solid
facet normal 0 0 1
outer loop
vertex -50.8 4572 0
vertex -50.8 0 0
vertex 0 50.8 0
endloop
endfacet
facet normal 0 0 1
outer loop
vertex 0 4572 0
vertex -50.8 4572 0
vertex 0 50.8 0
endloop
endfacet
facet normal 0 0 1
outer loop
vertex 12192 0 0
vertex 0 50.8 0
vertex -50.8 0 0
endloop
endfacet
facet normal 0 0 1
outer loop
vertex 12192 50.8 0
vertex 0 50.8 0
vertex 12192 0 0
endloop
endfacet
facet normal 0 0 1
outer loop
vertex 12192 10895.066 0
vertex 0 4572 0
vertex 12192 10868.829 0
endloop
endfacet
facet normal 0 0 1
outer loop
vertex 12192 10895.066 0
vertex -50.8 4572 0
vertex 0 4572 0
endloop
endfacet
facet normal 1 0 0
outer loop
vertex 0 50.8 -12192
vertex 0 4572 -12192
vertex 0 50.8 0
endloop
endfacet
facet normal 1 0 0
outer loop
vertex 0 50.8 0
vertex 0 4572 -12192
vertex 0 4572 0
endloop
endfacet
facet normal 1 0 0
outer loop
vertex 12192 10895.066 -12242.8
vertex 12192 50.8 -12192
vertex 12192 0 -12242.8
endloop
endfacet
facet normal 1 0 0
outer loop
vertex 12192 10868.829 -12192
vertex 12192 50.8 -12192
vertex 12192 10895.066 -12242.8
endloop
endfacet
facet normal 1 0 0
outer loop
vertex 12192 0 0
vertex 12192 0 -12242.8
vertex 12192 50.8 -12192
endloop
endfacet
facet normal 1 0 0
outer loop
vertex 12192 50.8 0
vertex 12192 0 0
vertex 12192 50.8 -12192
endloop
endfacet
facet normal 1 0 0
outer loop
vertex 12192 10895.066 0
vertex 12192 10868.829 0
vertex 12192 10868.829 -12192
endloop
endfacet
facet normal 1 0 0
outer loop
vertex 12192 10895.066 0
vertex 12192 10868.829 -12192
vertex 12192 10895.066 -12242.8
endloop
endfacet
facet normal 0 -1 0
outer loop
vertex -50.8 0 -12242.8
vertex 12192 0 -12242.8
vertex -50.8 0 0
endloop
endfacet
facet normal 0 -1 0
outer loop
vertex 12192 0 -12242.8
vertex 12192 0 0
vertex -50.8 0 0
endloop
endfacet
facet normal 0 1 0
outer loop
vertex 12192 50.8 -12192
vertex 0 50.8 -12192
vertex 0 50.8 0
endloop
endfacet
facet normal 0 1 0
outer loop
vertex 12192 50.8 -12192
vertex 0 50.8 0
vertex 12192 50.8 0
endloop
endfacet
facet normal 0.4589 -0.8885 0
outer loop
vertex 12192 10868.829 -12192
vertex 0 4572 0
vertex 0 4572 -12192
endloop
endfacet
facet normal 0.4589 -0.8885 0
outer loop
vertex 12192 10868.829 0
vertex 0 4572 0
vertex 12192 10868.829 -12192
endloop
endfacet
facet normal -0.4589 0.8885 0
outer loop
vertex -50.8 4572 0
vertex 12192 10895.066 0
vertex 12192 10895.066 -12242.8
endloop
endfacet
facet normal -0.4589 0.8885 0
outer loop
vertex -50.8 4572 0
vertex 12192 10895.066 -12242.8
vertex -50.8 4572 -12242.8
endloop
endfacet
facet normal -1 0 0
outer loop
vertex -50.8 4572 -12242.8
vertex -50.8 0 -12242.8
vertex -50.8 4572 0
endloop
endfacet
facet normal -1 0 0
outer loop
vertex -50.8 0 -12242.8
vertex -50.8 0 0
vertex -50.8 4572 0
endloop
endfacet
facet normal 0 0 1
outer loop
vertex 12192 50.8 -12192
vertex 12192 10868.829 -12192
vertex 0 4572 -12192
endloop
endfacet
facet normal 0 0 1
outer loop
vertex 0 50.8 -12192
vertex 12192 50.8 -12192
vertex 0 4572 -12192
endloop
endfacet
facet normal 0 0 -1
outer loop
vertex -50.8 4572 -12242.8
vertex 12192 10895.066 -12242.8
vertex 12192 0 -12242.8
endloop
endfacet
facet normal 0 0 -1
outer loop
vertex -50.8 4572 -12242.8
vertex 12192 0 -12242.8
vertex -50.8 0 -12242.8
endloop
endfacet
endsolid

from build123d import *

# Parameters (mm, degrees)
SKETCH2_W           = 12192
SKETCH2_H           = 12192
BOSS_EXTRUDE1_DEPTH = 50.8
SKETCH3_W           = 12192
SKETCH3_H           = 4572
BOSS_EXTRUDE2_DEPTH = 50.8
SKETCH4_W           = 12242.8
SKETCH4_H           = 4572
BOSS_EXTRUDE3_DEPTH = 50.8
BOSS_EXTRUDE4_REACH = 17874.722
BOSS_EXTRUDE5_DEPTH = 50.8


with BuildPart() as part:
    # Sketch2 → Boss-Extrude1 (new body)
    with BuildSketch(Plane(origin=(0, 0, 0), x_dir=(1, 0, 0), z_dir=(0, 1, 0))):
        with Locations((6096, 6096)):
            Rectangle(SKETCH2_W, SKETCH2_H)
    extrude(amount=BOSS_EXTRUDE1_DEPTH)

    # Sketch3 → Boss-Extrude2 (add)
    with BuildSketch(Plane.ZY):
        with Locations((-6096, 2286)):
            Rectangle(SKETCH3_W, SKETCH3_H)
    extrude(amount=BOSS_EXTRUDE2_DEPTH)

    # Sketch4 → Boss-Extrude3 (add)
    with BuildSketch(Plane(origin=(0, 0, -12192), x_dir=(-1, 0, 0), z_dir=(0, 0, -1))):
        with Locations((-6070.6, 2286)):
            Rectangle(SKETCH4_W, SKETCH4_H)
    extrude(amount=BOSS_EXTRUDE3_DEPTH)

    # Boss-Extrude4: up to this face of the body (flat: up to its plane)
    boss_extrude4_end = Plane(part.part.faces().sort_by_distance((6070.6, 2286, -12242.8))[0])
    # Sketch5 → Boss-Extrude4 (add, up to the picked face)
    with BuildSketch(Plane.XY, mode=Mode.PRIVATE) as boss_extrude4_sk1:
        Polygon((-50.8, 4572), (0, 4572), (12192, 10868.829376601), (12192, 10895.06616567), align=None)
    boss_extrude4_tool1 = split(extrude(boss_extrude4_sk1.sketch, amount=-BOSS_EXTRUDE4_REACH, mode=Mode.PRIVATE), bisect_by=boss_extrude4_end, keep=Keep.BOTH, mode=Mode.PRIVATE)
    add(boss_extrude4_tool1.solids().sort_by(Axis((6083.291199, 7726.978431, 0), (0, 0, -1)))[0])

    # Sketch6 → Boss-Extrude5 (add)
    with BuildSketch(Plane(origin=(0, 0, -12242.8), x_dir=(-1, 0, 0), z_dir=(0, 0, -1))):
        Polygon((-12192, 10895.06616567), (-12192, 4572), (50.8, 4572), align=None)
    extrude(amount=-BOSS_EXTRUDE5_DEPTH)


solid = part.part
